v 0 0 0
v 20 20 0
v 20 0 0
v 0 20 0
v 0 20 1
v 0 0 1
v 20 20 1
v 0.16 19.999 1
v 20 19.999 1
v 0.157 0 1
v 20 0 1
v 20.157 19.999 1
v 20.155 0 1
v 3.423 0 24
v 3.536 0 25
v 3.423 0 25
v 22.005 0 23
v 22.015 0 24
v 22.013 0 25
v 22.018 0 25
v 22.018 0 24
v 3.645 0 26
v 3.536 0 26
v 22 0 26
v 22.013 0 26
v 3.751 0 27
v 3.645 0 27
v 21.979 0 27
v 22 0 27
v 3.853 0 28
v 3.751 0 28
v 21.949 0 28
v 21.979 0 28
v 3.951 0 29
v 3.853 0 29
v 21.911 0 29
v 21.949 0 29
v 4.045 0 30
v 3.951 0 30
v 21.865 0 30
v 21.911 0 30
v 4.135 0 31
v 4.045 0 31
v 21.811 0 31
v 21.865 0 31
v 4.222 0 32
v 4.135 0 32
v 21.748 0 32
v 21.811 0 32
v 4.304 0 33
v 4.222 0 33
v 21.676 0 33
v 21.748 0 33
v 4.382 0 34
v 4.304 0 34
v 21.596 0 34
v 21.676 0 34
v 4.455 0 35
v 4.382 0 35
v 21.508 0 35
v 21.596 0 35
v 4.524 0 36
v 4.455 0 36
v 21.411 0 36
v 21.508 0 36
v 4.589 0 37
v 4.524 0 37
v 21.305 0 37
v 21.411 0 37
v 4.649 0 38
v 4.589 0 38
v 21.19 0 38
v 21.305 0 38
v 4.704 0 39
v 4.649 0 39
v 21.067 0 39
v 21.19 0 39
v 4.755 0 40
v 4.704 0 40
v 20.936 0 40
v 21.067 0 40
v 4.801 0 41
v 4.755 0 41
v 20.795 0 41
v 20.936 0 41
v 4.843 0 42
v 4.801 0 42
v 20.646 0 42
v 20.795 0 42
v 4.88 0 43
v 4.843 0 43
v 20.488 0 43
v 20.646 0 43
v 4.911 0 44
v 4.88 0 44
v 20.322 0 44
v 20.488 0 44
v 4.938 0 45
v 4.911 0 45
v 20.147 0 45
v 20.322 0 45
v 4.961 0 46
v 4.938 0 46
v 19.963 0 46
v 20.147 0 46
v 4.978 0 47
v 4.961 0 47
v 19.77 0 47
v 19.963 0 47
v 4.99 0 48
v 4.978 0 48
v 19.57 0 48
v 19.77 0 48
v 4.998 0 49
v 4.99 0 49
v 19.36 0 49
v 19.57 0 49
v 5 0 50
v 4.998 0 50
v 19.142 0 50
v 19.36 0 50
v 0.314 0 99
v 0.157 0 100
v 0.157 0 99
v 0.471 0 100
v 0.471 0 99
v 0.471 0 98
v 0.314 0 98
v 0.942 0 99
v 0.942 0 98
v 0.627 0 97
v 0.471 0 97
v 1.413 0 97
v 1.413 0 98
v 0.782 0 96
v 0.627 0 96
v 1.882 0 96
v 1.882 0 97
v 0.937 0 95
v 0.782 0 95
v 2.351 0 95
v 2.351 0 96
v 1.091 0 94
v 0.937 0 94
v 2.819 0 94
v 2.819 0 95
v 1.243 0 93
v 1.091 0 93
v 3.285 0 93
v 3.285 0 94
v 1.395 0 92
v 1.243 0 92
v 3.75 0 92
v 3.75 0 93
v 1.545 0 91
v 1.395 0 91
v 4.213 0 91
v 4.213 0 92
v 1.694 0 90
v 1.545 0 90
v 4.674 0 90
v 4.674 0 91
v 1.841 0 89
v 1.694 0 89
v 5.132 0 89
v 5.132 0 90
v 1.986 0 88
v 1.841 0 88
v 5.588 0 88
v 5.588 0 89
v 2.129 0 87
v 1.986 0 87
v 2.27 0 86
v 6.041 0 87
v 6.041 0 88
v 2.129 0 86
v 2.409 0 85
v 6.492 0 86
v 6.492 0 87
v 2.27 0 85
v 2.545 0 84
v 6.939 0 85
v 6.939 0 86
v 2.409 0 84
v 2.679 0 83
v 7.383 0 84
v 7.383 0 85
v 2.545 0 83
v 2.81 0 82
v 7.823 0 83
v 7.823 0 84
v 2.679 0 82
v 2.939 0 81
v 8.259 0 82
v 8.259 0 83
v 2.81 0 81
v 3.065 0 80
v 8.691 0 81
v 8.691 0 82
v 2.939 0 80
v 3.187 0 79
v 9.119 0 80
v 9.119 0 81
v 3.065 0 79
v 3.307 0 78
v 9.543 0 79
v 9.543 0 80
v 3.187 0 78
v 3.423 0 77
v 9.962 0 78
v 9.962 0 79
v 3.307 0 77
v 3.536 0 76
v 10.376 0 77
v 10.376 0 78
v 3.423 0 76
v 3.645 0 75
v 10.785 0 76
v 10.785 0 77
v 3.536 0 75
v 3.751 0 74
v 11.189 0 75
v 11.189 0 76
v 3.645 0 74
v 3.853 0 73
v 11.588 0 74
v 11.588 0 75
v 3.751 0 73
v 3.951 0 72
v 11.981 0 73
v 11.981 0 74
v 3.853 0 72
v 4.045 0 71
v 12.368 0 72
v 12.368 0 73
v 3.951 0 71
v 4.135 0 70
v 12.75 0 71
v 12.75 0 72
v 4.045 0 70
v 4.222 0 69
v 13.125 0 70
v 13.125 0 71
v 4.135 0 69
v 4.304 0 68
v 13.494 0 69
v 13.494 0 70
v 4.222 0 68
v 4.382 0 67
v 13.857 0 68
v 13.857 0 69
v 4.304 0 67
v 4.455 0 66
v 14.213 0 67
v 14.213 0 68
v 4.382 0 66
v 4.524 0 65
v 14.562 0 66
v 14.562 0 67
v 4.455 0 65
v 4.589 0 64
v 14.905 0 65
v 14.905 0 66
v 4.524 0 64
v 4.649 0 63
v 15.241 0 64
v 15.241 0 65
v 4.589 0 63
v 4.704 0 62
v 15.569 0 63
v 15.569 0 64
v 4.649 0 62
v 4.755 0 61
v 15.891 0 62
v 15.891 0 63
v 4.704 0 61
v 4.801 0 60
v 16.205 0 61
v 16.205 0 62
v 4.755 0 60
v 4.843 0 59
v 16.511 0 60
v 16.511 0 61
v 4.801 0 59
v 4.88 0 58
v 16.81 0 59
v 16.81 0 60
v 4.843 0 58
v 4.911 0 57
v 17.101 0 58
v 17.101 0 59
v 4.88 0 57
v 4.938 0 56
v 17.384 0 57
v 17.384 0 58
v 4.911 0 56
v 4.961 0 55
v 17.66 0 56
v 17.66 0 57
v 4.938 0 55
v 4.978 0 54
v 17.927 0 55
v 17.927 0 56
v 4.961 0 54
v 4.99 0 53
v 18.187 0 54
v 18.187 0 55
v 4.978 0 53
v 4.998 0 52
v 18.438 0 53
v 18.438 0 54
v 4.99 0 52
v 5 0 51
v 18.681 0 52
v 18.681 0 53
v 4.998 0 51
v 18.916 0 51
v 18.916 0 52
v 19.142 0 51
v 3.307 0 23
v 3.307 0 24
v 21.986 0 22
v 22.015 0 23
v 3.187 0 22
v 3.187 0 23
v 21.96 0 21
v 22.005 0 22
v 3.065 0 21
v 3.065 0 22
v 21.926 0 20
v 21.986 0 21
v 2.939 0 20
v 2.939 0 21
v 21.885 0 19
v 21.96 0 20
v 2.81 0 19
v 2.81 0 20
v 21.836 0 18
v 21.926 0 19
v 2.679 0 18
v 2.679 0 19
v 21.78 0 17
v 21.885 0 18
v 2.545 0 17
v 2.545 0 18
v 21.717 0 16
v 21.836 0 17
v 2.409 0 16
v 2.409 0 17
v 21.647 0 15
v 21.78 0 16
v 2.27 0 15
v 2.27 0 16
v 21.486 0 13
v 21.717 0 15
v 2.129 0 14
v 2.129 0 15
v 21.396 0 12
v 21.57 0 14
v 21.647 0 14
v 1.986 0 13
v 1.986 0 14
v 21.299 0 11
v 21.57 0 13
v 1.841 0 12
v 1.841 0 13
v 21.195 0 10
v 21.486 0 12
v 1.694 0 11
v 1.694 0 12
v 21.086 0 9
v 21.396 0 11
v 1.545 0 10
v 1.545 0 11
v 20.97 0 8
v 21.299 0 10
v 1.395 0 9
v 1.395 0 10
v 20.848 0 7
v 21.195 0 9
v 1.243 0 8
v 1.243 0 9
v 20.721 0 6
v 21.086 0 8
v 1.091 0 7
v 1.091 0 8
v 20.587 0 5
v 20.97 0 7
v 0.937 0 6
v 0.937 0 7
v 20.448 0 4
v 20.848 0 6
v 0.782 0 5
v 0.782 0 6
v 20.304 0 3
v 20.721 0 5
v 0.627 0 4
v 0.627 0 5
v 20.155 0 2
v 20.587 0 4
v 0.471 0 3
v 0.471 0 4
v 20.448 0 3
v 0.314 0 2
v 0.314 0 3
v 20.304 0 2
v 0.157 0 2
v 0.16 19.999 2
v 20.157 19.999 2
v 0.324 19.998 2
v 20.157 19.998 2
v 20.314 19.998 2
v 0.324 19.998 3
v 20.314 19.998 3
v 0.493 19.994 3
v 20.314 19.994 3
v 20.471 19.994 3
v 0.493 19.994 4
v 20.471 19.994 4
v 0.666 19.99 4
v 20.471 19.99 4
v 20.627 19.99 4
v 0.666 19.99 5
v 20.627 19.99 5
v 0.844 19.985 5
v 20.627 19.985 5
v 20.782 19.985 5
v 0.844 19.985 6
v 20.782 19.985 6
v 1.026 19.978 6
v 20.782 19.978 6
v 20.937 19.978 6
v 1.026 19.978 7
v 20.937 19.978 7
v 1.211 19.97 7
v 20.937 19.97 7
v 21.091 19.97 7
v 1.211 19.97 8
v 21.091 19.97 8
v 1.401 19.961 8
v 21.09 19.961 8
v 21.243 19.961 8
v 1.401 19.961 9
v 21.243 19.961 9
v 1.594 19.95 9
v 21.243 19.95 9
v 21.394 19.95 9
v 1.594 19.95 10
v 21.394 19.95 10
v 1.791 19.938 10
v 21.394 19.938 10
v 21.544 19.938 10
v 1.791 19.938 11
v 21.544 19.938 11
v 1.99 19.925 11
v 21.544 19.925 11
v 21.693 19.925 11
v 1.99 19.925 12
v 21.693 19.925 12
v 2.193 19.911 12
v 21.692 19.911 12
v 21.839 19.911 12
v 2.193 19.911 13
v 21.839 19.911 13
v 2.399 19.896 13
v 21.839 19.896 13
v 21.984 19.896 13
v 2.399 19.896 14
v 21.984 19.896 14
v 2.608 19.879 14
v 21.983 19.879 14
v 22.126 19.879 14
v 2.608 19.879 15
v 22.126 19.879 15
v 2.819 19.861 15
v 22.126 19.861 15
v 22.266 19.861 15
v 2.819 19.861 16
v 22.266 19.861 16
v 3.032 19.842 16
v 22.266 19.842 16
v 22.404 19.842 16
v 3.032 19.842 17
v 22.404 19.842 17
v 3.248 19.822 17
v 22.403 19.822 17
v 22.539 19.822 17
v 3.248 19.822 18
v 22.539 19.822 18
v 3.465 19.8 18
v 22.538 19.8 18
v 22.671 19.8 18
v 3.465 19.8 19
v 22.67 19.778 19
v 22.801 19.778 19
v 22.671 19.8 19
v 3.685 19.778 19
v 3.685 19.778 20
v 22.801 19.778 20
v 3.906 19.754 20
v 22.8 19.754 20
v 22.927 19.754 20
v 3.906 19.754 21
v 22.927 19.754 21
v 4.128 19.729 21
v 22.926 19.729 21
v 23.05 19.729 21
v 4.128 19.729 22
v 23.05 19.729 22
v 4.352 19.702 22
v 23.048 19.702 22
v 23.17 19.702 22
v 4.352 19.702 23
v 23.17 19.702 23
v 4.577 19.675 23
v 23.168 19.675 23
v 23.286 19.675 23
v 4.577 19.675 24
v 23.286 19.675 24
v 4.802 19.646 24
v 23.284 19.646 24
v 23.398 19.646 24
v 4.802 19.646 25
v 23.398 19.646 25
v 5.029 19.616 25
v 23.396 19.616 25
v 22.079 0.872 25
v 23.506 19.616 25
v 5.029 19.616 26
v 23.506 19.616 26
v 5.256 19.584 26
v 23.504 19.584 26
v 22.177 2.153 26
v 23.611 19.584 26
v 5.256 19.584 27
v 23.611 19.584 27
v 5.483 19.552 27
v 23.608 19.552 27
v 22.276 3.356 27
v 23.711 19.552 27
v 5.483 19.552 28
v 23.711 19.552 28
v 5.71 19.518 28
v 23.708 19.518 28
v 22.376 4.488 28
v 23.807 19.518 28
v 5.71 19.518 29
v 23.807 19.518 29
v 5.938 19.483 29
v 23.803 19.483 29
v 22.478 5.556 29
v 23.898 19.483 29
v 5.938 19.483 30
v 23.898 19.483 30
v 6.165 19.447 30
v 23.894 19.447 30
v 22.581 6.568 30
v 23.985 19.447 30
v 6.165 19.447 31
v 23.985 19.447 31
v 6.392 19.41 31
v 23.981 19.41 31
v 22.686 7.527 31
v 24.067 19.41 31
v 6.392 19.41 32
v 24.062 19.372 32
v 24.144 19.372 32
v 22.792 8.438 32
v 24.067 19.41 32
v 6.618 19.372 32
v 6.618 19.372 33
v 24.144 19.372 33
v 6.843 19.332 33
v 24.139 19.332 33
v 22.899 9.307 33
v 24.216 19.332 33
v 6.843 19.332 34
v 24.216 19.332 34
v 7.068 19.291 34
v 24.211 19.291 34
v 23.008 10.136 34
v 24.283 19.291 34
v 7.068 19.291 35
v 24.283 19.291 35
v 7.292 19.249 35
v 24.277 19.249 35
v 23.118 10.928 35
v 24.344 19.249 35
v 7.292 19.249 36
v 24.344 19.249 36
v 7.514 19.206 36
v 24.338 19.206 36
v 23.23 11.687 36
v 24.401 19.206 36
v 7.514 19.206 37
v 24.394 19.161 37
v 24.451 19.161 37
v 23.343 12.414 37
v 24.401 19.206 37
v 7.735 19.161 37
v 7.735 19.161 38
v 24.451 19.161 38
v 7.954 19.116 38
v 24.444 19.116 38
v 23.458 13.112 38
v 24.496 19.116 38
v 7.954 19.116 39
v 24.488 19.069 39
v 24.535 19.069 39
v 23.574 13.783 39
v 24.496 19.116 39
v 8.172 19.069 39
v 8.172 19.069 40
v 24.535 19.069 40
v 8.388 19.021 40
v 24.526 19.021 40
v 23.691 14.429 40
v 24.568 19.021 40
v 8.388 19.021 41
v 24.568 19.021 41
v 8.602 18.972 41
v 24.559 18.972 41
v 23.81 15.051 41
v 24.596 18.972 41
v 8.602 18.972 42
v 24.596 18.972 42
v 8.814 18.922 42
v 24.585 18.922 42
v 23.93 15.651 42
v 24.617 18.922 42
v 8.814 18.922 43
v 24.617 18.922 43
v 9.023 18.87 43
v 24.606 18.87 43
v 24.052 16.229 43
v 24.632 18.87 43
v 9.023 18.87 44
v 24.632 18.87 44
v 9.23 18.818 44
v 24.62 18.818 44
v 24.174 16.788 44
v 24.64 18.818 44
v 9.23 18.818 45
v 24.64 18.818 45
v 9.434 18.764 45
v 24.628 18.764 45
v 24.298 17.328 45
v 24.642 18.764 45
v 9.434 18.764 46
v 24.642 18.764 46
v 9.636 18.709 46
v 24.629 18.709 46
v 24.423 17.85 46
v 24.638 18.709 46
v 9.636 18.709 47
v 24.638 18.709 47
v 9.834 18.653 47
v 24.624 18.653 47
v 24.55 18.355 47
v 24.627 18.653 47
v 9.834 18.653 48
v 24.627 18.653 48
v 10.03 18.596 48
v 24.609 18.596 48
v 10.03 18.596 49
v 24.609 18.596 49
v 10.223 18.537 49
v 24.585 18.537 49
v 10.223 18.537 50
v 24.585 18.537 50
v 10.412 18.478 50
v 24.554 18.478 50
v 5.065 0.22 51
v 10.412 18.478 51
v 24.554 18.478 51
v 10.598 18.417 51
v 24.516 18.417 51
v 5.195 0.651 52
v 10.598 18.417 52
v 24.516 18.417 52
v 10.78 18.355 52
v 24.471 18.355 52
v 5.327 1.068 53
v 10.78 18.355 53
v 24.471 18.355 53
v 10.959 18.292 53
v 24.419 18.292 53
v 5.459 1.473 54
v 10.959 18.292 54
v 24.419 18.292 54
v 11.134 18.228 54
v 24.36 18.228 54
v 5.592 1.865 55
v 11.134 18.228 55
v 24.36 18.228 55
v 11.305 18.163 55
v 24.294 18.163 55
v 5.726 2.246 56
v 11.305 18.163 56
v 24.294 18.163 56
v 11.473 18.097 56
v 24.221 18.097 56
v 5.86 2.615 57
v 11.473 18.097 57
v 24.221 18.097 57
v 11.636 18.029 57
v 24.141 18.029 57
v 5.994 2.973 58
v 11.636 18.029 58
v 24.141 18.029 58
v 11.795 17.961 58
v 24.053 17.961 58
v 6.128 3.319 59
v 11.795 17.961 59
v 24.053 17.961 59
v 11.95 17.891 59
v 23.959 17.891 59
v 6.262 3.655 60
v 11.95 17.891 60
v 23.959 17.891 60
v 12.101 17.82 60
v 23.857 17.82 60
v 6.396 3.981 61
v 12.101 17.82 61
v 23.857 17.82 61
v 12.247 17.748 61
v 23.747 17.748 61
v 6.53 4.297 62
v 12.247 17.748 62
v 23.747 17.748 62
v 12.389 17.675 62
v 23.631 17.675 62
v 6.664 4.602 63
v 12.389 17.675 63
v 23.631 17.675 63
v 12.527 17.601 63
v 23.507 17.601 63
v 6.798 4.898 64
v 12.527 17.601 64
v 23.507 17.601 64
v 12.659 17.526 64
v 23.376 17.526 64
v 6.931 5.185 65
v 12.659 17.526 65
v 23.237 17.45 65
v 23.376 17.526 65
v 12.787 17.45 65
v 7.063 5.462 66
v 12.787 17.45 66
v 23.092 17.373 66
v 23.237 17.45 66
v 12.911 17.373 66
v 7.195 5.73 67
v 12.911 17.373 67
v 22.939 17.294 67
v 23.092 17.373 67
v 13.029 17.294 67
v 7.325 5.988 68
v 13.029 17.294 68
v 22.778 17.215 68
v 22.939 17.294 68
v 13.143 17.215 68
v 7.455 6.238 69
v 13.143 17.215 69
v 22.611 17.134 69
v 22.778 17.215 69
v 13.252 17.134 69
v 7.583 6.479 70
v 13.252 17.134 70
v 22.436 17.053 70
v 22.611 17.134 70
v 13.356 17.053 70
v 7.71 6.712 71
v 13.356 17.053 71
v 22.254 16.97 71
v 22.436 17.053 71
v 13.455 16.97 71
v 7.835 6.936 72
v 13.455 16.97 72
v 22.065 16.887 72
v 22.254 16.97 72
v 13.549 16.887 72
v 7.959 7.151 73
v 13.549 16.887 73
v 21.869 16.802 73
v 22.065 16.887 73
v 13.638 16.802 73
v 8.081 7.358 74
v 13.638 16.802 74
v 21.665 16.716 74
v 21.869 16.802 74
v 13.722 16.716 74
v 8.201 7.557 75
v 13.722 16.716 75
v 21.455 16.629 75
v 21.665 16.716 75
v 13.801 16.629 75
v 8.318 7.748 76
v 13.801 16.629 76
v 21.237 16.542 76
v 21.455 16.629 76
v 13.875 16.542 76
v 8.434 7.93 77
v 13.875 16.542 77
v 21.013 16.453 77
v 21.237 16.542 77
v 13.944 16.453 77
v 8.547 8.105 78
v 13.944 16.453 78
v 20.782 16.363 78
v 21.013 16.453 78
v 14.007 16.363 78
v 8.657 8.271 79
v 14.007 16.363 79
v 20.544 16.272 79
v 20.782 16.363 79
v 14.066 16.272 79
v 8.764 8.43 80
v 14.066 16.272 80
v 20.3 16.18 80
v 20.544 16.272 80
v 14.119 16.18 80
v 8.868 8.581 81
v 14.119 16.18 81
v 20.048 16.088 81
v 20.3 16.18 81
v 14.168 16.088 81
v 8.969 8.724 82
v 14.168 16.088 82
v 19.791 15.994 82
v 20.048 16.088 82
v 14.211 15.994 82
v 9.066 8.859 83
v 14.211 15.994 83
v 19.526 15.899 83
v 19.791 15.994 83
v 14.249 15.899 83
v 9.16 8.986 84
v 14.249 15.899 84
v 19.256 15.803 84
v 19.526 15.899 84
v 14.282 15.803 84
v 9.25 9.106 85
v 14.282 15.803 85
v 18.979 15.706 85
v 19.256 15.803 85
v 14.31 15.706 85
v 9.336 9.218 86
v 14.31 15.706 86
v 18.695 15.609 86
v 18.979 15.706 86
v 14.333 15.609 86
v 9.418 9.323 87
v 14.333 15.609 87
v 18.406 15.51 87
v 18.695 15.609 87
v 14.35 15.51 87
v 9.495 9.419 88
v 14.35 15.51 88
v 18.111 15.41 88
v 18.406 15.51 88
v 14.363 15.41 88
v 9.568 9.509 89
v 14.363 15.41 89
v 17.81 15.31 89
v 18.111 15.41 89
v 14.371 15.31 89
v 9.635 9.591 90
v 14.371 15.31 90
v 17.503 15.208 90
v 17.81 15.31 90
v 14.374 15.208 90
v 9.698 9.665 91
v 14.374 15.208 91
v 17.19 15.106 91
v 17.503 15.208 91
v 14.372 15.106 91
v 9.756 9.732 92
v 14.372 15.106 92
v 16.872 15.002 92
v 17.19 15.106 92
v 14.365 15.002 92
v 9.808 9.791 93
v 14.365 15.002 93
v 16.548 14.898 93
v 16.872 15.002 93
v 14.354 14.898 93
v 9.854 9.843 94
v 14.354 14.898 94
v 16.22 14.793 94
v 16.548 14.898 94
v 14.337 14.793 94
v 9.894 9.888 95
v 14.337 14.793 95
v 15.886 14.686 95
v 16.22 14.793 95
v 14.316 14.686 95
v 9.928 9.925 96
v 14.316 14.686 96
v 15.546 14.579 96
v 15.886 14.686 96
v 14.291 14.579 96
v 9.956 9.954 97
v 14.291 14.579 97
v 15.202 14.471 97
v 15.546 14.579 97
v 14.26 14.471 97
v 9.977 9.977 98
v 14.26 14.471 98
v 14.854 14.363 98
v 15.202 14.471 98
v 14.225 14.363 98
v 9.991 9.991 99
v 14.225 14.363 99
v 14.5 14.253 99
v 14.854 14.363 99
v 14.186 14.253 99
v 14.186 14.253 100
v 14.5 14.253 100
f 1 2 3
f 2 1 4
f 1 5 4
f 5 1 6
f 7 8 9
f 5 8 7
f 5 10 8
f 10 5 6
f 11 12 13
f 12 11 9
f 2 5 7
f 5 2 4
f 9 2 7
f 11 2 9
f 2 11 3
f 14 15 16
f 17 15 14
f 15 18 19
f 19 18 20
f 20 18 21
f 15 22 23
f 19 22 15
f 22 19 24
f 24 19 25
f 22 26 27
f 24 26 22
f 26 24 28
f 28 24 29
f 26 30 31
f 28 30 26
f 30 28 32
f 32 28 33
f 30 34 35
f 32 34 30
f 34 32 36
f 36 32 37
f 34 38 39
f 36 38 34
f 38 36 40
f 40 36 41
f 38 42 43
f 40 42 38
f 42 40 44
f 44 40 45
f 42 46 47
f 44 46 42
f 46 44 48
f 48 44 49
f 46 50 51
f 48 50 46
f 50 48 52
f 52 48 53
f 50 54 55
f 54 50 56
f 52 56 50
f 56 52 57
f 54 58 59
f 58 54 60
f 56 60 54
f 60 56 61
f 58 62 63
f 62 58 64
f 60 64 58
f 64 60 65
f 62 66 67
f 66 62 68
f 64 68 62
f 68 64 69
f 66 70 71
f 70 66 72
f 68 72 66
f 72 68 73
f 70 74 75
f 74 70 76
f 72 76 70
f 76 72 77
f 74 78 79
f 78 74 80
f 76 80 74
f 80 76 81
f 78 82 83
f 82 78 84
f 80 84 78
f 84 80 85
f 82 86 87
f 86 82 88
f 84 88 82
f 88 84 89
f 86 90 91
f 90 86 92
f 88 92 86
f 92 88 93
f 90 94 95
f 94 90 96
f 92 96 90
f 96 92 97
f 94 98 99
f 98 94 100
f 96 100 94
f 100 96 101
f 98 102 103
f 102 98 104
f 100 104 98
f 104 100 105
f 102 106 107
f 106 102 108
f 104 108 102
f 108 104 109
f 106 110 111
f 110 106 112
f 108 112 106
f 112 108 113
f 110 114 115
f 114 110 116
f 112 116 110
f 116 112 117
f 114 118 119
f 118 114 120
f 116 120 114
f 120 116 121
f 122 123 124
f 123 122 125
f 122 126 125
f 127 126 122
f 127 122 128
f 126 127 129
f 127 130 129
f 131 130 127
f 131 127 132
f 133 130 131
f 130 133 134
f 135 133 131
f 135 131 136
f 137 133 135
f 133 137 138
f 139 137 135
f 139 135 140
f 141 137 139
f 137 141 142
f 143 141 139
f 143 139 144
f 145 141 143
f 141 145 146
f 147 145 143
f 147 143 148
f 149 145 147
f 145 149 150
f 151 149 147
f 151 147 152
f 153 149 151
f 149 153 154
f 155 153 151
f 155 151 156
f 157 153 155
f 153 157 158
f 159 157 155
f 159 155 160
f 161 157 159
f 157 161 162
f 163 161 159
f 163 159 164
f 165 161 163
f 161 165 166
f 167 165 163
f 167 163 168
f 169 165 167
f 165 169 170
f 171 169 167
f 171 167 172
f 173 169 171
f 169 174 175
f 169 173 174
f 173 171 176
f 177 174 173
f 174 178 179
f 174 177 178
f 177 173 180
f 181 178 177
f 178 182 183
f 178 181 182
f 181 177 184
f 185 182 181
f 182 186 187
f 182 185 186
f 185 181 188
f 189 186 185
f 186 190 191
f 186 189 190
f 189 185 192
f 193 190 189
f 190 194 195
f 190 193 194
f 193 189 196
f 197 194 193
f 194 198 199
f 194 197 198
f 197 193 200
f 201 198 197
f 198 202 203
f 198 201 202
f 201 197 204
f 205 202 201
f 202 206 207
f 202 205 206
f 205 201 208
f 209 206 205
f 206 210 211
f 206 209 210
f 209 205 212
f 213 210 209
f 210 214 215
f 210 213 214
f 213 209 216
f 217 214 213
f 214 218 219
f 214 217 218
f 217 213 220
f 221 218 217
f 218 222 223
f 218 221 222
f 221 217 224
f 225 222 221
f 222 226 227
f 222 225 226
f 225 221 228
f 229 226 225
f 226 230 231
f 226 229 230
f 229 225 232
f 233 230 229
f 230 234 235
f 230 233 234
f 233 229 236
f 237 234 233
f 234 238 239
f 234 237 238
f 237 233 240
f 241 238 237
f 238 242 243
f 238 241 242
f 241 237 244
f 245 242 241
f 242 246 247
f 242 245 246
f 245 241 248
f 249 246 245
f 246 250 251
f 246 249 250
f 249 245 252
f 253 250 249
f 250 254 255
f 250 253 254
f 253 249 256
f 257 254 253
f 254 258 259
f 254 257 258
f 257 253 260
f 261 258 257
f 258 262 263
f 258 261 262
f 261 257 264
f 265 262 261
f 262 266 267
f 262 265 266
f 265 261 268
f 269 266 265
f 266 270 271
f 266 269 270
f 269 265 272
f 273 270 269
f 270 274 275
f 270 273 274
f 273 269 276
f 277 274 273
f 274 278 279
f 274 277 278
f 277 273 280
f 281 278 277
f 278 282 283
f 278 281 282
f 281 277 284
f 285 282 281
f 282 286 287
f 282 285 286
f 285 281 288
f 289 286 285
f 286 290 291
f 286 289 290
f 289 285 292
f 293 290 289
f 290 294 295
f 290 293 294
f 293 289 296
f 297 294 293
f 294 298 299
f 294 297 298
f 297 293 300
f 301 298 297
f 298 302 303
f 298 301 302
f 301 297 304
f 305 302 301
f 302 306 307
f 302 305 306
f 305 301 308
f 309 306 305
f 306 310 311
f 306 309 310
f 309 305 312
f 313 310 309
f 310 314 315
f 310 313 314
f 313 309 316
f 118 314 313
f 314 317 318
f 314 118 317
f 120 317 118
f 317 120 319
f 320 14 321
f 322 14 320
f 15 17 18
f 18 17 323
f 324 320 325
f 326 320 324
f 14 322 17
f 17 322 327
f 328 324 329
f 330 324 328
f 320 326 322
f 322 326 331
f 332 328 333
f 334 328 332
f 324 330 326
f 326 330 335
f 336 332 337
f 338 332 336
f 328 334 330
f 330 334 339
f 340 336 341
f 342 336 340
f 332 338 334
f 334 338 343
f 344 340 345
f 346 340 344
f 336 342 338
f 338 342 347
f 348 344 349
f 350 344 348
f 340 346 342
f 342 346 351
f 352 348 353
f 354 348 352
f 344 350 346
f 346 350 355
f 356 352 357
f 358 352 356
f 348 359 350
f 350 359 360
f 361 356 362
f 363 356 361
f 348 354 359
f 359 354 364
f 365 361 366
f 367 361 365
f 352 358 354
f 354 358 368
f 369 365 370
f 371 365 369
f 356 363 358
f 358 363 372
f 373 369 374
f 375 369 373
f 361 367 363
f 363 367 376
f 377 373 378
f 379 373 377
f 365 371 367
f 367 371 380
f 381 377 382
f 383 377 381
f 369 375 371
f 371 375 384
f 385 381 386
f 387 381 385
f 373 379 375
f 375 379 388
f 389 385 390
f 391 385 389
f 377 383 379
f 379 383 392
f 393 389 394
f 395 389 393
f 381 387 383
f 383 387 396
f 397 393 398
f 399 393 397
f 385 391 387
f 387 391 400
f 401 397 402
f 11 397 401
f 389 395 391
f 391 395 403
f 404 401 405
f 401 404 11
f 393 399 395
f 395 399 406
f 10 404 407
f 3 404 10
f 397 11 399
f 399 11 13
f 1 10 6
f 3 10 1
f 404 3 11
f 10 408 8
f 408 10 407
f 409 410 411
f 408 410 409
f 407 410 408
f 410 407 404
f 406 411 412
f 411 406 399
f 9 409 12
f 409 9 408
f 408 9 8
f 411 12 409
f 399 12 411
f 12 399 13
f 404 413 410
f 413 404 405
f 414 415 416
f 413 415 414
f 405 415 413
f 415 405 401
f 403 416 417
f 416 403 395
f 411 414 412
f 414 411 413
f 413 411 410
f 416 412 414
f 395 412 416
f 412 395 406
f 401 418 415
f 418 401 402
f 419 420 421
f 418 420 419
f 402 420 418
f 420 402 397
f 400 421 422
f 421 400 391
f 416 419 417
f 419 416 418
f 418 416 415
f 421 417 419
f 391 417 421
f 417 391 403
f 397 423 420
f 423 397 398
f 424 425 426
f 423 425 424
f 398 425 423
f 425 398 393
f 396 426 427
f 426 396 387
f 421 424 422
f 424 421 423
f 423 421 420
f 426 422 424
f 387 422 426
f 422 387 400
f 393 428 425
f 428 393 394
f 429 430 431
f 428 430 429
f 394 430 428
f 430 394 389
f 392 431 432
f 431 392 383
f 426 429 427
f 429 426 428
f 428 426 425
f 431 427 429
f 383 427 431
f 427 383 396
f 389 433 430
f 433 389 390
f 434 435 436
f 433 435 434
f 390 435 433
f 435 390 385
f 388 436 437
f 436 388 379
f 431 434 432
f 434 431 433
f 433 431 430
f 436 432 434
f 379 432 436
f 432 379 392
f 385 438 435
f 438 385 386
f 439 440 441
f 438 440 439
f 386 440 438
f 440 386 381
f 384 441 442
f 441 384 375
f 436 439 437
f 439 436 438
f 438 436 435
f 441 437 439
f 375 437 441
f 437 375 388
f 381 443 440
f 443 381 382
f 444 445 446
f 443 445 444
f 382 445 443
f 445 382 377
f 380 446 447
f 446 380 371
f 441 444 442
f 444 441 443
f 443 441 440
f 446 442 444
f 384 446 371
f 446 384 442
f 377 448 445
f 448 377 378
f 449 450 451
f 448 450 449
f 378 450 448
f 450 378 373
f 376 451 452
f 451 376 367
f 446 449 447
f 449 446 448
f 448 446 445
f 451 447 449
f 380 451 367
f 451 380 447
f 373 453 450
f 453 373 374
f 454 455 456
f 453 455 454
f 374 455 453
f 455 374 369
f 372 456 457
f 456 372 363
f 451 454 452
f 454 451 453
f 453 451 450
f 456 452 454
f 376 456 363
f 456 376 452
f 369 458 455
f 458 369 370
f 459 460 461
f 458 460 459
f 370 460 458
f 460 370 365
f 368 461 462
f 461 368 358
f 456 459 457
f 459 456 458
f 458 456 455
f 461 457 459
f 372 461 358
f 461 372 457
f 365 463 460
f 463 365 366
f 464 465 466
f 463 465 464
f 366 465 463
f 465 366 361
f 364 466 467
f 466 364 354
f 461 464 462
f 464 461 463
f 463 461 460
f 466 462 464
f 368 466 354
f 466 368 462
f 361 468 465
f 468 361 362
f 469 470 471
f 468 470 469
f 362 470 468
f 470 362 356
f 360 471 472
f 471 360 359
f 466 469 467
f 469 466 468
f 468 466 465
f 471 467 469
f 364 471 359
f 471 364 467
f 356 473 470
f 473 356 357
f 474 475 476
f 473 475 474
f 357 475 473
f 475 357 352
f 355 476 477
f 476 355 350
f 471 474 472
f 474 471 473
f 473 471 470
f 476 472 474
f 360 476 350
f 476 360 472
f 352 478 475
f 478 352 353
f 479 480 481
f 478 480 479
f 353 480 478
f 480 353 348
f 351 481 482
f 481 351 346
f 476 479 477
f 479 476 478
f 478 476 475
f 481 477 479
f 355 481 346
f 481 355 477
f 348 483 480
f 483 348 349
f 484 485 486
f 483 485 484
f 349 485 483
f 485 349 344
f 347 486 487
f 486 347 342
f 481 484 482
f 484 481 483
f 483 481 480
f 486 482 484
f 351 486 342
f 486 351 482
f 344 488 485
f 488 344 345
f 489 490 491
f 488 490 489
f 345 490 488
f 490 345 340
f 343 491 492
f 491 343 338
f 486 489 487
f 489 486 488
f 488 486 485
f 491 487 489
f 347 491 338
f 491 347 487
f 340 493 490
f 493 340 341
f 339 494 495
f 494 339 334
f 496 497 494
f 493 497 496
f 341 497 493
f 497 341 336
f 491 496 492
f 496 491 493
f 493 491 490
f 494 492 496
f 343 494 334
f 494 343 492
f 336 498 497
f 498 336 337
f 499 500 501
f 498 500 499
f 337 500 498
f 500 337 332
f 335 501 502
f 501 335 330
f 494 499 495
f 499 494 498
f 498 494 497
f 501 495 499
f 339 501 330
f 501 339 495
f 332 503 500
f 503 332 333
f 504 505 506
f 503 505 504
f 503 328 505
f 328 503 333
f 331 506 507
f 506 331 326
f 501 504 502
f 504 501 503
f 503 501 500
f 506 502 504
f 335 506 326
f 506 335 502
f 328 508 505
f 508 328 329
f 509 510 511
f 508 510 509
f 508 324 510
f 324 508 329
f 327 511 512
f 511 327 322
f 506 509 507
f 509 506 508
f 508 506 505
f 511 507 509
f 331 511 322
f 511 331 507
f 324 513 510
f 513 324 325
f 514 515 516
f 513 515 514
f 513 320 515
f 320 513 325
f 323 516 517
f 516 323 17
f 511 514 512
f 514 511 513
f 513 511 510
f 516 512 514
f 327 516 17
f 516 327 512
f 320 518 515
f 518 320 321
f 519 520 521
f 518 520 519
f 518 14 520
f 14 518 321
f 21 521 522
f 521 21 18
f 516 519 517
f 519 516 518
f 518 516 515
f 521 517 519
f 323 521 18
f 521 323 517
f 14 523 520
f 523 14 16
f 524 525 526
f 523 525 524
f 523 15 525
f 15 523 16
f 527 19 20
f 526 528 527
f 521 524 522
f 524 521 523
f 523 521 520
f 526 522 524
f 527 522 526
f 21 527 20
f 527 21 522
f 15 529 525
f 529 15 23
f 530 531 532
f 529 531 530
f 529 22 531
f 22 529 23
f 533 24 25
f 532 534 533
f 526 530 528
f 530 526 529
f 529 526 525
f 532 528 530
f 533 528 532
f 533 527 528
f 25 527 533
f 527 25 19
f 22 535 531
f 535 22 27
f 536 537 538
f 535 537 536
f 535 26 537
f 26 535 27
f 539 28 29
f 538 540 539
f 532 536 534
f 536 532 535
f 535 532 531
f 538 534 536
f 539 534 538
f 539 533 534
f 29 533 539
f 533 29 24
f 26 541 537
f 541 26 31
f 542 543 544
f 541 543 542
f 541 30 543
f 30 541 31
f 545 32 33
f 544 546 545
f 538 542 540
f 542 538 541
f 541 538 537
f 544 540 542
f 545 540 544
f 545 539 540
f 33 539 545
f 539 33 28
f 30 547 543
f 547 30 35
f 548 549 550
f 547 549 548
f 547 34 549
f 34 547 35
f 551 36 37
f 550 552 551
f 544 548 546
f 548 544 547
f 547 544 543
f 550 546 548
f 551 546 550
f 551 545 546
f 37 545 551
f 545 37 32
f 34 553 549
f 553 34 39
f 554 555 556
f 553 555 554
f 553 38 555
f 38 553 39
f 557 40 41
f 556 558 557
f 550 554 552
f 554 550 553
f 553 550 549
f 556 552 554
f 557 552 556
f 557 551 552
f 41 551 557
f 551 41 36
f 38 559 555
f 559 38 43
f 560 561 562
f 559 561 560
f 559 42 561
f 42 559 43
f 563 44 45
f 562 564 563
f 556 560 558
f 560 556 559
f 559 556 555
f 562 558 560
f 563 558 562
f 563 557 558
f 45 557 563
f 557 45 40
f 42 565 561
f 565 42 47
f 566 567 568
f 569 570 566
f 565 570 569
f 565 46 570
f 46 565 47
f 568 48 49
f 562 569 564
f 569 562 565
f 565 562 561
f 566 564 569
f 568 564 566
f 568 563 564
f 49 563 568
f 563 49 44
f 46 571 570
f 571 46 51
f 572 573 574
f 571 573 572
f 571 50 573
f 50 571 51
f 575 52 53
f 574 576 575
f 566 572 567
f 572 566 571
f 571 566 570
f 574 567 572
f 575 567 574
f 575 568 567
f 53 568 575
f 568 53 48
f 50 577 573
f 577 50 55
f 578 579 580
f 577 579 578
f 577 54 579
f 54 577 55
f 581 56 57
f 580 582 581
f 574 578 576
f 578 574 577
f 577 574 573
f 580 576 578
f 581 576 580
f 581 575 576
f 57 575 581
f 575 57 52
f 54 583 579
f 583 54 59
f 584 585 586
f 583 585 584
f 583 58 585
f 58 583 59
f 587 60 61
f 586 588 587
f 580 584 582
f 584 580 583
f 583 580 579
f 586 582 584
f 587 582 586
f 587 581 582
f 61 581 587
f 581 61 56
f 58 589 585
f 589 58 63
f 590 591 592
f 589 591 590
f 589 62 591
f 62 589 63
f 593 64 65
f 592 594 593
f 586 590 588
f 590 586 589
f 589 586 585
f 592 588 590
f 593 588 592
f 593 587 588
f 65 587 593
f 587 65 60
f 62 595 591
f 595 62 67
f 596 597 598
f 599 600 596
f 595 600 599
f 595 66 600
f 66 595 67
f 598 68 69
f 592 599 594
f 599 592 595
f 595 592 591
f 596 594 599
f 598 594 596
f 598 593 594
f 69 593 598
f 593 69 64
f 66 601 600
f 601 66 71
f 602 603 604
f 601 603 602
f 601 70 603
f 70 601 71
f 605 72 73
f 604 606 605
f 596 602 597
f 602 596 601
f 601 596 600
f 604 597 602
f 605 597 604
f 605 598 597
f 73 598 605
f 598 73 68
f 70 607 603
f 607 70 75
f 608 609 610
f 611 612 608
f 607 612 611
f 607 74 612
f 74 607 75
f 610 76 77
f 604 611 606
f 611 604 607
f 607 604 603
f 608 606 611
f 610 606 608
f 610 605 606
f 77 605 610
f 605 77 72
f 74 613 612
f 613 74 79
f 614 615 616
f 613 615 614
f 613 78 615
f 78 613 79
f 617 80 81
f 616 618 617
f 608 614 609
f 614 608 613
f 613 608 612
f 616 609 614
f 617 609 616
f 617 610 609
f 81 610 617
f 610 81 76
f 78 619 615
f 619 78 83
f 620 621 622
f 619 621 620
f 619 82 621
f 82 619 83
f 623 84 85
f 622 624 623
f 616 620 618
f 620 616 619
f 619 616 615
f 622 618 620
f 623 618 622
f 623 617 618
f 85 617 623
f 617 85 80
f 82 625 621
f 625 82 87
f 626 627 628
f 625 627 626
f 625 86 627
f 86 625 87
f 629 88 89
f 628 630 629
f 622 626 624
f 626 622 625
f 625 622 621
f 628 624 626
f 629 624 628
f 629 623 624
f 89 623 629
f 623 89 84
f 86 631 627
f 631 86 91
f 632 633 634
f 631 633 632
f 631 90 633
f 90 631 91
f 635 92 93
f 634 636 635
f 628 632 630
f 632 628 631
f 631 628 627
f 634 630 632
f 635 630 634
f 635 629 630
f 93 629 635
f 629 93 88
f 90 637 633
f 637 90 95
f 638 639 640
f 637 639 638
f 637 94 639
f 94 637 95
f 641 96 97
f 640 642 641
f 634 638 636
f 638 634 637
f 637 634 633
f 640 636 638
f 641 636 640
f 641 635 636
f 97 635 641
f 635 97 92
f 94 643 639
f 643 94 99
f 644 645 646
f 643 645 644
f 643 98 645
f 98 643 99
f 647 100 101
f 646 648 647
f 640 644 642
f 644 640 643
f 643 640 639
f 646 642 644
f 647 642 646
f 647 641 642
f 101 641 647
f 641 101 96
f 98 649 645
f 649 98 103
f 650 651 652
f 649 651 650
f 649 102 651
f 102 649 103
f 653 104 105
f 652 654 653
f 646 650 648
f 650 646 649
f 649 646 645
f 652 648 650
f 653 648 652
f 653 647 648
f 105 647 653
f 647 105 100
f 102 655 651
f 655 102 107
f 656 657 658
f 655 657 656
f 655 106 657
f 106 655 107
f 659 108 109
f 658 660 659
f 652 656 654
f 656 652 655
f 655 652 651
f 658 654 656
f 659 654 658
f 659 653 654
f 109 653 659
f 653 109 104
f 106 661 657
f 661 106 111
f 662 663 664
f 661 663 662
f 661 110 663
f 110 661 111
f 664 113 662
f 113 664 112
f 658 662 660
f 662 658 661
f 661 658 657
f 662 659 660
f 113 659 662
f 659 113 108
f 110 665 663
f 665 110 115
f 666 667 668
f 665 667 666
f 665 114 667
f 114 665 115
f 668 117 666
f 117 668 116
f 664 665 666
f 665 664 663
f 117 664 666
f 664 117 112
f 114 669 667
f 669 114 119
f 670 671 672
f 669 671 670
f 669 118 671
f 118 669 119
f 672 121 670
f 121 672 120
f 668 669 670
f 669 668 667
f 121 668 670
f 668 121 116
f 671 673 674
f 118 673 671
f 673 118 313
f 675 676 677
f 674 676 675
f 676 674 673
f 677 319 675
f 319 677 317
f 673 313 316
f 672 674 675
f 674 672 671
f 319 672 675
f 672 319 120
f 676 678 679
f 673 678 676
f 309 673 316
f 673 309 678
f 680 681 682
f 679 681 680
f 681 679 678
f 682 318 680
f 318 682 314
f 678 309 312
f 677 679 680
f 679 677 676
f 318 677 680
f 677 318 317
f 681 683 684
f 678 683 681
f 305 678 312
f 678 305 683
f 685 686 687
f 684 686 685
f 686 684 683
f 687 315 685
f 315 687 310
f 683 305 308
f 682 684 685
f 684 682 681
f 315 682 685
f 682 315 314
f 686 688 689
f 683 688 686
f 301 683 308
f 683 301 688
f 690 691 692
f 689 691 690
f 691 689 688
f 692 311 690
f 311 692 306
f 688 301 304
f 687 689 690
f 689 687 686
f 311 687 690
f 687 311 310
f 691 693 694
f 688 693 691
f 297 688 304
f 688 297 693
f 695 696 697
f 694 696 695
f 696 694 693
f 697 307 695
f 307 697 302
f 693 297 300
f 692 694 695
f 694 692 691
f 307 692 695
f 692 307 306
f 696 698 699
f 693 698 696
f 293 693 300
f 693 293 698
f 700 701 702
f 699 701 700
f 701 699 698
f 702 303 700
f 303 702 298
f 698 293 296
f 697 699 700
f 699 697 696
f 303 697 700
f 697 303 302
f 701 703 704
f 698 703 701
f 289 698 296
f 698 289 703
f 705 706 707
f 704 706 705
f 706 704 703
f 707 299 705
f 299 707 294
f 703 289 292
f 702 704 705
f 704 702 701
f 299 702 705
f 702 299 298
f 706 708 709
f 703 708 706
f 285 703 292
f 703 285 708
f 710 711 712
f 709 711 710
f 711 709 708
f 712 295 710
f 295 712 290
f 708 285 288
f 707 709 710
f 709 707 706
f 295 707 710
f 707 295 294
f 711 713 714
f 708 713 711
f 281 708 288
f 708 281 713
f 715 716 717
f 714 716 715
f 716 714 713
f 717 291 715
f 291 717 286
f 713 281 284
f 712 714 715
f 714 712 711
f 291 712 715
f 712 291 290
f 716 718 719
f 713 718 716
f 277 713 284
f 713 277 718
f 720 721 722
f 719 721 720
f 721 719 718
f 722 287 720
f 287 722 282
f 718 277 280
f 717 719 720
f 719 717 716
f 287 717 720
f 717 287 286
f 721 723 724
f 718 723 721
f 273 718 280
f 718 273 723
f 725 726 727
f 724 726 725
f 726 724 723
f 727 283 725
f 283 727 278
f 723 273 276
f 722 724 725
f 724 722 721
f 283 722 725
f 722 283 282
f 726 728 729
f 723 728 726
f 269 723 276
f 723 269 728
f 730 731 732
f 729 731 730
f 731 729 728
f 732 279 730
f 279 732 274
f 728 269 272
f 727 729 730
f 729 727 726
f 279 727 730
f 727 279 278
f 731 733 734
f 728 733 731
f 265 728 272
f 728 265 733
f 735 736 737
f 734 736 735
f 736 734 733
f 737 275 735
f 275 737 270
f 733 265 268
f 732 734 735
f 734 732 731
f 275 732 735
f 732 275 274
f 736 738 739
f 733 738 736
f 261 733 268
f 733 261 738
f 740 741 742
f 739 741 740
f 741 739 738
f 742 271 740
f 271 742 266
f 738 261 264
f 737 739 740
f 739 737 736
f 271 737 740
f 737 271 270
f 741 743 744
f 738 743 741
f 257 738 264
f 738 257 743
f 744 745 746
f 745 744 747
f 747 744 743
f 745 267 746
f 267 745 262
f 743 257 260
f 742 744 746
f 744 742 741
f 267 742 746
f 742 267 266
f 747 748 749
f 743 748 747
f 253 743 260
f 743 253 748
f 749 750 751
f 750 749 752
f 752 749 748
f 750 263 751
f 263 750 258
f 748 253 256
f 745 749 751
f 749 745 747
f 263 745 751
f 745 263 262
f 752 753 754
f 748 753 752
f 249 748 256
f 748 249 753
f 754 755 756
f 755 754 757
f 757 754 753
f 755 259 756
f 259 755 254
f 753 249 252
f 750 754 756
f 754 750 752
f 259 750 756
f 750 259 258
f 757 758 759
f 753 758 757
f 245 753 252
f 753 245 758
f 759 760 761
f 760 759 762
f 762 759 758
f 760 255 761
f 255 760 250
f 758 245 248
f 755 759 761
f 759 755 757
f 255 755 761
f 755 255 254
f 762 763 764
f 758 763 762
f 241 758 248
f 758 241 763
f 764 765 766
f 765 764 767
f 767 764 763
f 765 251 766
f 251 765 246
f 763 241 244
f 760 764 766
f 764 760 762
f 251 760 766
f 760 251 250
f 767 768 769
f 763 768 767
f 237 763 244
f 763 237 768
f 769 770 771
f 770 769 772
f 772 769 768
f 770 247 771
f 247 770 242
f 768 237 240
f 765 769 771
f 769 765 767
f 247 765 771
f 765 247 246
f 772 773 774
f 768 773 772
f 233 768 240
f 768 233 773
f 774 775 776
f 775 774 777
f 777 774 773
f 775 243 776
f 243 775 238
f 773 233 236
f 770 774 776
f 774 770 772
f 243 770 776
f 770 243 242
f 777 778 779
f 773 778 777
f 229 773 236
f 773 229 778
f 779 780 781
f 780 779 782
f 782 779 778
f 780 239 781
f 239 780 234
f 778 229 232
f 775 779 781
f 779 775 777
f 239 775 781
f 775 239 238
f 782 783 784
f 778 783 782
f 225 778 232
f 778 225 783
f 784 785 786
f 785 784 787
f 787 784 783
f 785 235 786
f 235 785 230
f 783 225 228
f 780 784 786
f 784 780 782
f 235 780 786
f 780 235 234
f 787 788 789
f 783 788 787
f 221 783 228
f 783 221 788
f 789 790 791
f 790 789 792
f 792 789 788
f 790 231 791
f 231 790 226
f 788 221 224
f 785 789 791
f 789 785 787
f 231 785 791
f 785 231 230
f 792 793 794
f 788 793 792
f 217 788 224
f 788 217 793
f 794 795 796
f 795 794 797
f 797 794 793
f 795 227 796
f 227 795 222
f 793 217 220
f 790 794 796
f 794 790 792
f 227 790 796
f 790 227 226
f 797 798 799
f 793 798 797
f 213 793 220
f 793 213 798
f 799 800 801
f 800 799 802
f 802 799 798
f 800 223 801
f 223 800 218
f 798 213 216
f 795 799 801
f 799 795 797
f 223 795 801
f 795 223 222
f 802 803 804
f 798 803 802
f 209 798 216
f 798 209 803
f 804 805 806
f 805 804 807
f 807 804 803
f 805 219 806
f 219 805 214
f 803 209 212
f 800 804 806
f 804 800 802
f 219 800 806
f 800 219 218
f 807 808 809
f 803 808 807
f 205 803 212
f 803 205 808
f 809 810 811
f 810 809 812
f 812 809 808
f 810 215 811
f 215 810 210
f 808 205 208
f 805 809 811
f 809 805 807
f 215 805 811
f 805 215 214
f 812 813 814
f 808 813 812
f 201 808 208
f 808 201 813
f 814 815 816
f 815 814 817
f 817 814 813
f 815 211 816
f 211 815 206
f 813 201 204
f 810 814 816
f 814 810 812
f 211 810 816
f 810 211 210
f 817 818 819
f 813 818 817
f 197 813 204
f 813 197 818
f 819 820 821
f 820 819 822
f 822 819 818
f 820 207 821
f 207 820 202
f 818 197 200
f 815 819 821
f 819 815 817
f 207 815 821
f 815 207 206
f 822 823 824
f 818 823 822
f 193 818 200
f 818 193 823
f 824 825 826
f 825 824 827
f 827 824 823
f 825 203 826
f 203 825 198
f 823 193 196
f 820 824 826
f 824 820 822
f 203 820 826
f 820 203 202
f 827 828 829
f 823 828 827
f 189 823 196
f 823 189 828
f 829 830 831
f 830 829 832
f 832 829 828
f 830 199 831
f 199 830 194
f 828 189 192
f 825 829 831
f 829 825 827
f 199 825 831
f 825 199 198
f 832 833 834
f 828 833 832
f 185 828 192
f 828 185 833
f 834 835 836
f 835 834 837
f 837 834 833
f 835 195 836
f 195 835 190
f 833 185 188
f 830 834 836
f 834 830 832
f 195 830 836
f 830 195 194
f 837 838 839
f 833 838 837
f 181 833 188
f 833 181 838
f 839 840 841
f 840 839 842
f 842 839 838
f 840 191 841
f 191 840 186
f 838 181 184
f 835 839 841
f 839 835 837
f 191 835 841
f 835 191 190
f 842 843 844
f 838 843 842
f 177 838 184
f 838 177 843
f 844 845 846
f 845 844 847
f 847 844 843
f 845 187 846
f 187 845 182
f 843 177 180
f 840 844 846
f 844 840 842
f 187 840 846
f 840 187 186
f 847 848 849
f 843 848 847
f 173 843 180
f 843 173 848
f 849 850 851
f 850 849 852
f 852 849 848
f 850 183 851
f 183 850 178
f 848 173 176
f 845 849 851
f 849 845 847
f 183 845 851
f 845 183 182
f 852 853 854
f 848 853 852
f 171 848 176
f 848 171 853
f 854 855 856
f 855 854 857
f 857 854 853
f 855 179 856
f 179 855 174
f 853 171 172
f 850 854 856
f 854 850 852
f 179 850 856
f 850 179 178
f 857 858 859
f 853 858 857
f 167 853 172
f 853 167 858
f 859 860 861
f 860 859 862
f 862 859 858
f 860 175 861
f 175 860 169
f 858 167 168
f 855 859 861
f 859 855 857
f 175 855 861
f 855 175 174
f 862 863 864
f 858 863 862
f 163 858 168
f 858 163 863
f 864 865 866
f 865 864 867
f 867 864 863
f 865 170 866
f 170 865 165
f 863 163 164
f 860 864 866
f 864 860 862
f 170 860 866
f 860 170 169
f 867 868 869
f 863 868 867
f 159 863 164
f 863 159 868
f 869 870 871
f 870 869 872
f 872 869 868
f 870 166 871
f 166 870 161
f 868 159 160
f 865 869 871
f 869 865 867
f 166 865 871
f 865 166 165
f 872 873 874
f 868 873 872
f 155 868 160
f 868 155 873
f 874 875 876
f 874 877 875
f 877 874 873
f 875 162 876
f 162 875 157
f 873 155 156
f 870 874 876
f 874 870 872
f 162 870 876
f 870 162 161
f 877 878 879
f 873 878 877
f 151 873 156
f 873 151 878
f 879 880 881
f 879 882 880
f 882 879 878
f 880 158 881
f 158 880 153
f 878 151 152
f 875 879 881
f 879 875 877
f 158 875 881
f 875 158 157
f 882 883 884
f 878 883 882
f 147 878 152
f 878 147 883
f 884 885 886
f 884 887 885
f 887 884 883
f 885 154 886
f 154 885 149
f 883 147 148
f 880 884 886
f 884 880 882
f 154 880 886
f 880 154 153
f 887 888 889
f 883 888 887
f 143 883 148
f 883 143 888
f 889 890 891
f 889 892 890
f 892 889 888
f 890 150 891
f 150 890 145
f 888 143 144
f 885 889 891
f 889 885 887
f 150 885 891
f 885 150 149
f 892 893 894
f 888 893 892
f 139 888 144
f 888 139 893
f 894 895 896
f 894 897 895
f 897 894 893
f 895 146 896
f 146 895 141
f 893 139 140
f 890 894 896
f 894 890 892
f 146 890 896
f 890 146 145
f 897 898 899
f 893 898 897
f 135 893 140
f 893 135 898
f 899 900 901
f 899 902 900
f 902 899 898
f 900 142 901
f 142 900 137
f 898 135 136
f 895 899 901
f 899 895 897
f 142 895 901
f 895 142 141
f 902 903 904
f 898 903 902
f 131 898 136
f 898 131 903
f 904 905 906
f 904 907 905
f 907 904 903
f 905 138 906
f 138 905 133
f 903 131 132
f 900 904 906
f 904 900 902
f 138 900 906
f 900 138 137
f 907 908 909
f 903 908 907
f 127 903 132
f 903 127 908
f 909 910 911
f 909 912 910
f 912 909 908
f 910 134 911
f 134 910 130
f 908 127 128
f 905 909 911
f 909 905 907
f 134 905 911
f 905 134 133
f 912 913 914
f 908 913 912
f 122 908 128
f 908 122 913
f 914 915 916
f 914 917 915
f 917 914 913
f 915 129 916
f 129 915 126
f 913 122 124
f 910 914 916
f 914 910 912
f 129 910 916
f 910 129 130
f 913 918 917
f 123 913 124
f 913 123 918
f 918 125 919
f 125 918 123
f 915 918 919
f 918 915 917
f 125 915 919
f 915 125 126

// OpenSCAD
isteps = 100;
height = 100;
    union(){  
        for(i = [ 0: 1: isteps-1]){
            translate([5*sin(i/isteps*180),0,i*height/isteps])
                linear_extrude(height=height/isteps)
                    rotate([45*(i/isteps),90*(i/isteps),0])
                        square(20,20);
    }
}
